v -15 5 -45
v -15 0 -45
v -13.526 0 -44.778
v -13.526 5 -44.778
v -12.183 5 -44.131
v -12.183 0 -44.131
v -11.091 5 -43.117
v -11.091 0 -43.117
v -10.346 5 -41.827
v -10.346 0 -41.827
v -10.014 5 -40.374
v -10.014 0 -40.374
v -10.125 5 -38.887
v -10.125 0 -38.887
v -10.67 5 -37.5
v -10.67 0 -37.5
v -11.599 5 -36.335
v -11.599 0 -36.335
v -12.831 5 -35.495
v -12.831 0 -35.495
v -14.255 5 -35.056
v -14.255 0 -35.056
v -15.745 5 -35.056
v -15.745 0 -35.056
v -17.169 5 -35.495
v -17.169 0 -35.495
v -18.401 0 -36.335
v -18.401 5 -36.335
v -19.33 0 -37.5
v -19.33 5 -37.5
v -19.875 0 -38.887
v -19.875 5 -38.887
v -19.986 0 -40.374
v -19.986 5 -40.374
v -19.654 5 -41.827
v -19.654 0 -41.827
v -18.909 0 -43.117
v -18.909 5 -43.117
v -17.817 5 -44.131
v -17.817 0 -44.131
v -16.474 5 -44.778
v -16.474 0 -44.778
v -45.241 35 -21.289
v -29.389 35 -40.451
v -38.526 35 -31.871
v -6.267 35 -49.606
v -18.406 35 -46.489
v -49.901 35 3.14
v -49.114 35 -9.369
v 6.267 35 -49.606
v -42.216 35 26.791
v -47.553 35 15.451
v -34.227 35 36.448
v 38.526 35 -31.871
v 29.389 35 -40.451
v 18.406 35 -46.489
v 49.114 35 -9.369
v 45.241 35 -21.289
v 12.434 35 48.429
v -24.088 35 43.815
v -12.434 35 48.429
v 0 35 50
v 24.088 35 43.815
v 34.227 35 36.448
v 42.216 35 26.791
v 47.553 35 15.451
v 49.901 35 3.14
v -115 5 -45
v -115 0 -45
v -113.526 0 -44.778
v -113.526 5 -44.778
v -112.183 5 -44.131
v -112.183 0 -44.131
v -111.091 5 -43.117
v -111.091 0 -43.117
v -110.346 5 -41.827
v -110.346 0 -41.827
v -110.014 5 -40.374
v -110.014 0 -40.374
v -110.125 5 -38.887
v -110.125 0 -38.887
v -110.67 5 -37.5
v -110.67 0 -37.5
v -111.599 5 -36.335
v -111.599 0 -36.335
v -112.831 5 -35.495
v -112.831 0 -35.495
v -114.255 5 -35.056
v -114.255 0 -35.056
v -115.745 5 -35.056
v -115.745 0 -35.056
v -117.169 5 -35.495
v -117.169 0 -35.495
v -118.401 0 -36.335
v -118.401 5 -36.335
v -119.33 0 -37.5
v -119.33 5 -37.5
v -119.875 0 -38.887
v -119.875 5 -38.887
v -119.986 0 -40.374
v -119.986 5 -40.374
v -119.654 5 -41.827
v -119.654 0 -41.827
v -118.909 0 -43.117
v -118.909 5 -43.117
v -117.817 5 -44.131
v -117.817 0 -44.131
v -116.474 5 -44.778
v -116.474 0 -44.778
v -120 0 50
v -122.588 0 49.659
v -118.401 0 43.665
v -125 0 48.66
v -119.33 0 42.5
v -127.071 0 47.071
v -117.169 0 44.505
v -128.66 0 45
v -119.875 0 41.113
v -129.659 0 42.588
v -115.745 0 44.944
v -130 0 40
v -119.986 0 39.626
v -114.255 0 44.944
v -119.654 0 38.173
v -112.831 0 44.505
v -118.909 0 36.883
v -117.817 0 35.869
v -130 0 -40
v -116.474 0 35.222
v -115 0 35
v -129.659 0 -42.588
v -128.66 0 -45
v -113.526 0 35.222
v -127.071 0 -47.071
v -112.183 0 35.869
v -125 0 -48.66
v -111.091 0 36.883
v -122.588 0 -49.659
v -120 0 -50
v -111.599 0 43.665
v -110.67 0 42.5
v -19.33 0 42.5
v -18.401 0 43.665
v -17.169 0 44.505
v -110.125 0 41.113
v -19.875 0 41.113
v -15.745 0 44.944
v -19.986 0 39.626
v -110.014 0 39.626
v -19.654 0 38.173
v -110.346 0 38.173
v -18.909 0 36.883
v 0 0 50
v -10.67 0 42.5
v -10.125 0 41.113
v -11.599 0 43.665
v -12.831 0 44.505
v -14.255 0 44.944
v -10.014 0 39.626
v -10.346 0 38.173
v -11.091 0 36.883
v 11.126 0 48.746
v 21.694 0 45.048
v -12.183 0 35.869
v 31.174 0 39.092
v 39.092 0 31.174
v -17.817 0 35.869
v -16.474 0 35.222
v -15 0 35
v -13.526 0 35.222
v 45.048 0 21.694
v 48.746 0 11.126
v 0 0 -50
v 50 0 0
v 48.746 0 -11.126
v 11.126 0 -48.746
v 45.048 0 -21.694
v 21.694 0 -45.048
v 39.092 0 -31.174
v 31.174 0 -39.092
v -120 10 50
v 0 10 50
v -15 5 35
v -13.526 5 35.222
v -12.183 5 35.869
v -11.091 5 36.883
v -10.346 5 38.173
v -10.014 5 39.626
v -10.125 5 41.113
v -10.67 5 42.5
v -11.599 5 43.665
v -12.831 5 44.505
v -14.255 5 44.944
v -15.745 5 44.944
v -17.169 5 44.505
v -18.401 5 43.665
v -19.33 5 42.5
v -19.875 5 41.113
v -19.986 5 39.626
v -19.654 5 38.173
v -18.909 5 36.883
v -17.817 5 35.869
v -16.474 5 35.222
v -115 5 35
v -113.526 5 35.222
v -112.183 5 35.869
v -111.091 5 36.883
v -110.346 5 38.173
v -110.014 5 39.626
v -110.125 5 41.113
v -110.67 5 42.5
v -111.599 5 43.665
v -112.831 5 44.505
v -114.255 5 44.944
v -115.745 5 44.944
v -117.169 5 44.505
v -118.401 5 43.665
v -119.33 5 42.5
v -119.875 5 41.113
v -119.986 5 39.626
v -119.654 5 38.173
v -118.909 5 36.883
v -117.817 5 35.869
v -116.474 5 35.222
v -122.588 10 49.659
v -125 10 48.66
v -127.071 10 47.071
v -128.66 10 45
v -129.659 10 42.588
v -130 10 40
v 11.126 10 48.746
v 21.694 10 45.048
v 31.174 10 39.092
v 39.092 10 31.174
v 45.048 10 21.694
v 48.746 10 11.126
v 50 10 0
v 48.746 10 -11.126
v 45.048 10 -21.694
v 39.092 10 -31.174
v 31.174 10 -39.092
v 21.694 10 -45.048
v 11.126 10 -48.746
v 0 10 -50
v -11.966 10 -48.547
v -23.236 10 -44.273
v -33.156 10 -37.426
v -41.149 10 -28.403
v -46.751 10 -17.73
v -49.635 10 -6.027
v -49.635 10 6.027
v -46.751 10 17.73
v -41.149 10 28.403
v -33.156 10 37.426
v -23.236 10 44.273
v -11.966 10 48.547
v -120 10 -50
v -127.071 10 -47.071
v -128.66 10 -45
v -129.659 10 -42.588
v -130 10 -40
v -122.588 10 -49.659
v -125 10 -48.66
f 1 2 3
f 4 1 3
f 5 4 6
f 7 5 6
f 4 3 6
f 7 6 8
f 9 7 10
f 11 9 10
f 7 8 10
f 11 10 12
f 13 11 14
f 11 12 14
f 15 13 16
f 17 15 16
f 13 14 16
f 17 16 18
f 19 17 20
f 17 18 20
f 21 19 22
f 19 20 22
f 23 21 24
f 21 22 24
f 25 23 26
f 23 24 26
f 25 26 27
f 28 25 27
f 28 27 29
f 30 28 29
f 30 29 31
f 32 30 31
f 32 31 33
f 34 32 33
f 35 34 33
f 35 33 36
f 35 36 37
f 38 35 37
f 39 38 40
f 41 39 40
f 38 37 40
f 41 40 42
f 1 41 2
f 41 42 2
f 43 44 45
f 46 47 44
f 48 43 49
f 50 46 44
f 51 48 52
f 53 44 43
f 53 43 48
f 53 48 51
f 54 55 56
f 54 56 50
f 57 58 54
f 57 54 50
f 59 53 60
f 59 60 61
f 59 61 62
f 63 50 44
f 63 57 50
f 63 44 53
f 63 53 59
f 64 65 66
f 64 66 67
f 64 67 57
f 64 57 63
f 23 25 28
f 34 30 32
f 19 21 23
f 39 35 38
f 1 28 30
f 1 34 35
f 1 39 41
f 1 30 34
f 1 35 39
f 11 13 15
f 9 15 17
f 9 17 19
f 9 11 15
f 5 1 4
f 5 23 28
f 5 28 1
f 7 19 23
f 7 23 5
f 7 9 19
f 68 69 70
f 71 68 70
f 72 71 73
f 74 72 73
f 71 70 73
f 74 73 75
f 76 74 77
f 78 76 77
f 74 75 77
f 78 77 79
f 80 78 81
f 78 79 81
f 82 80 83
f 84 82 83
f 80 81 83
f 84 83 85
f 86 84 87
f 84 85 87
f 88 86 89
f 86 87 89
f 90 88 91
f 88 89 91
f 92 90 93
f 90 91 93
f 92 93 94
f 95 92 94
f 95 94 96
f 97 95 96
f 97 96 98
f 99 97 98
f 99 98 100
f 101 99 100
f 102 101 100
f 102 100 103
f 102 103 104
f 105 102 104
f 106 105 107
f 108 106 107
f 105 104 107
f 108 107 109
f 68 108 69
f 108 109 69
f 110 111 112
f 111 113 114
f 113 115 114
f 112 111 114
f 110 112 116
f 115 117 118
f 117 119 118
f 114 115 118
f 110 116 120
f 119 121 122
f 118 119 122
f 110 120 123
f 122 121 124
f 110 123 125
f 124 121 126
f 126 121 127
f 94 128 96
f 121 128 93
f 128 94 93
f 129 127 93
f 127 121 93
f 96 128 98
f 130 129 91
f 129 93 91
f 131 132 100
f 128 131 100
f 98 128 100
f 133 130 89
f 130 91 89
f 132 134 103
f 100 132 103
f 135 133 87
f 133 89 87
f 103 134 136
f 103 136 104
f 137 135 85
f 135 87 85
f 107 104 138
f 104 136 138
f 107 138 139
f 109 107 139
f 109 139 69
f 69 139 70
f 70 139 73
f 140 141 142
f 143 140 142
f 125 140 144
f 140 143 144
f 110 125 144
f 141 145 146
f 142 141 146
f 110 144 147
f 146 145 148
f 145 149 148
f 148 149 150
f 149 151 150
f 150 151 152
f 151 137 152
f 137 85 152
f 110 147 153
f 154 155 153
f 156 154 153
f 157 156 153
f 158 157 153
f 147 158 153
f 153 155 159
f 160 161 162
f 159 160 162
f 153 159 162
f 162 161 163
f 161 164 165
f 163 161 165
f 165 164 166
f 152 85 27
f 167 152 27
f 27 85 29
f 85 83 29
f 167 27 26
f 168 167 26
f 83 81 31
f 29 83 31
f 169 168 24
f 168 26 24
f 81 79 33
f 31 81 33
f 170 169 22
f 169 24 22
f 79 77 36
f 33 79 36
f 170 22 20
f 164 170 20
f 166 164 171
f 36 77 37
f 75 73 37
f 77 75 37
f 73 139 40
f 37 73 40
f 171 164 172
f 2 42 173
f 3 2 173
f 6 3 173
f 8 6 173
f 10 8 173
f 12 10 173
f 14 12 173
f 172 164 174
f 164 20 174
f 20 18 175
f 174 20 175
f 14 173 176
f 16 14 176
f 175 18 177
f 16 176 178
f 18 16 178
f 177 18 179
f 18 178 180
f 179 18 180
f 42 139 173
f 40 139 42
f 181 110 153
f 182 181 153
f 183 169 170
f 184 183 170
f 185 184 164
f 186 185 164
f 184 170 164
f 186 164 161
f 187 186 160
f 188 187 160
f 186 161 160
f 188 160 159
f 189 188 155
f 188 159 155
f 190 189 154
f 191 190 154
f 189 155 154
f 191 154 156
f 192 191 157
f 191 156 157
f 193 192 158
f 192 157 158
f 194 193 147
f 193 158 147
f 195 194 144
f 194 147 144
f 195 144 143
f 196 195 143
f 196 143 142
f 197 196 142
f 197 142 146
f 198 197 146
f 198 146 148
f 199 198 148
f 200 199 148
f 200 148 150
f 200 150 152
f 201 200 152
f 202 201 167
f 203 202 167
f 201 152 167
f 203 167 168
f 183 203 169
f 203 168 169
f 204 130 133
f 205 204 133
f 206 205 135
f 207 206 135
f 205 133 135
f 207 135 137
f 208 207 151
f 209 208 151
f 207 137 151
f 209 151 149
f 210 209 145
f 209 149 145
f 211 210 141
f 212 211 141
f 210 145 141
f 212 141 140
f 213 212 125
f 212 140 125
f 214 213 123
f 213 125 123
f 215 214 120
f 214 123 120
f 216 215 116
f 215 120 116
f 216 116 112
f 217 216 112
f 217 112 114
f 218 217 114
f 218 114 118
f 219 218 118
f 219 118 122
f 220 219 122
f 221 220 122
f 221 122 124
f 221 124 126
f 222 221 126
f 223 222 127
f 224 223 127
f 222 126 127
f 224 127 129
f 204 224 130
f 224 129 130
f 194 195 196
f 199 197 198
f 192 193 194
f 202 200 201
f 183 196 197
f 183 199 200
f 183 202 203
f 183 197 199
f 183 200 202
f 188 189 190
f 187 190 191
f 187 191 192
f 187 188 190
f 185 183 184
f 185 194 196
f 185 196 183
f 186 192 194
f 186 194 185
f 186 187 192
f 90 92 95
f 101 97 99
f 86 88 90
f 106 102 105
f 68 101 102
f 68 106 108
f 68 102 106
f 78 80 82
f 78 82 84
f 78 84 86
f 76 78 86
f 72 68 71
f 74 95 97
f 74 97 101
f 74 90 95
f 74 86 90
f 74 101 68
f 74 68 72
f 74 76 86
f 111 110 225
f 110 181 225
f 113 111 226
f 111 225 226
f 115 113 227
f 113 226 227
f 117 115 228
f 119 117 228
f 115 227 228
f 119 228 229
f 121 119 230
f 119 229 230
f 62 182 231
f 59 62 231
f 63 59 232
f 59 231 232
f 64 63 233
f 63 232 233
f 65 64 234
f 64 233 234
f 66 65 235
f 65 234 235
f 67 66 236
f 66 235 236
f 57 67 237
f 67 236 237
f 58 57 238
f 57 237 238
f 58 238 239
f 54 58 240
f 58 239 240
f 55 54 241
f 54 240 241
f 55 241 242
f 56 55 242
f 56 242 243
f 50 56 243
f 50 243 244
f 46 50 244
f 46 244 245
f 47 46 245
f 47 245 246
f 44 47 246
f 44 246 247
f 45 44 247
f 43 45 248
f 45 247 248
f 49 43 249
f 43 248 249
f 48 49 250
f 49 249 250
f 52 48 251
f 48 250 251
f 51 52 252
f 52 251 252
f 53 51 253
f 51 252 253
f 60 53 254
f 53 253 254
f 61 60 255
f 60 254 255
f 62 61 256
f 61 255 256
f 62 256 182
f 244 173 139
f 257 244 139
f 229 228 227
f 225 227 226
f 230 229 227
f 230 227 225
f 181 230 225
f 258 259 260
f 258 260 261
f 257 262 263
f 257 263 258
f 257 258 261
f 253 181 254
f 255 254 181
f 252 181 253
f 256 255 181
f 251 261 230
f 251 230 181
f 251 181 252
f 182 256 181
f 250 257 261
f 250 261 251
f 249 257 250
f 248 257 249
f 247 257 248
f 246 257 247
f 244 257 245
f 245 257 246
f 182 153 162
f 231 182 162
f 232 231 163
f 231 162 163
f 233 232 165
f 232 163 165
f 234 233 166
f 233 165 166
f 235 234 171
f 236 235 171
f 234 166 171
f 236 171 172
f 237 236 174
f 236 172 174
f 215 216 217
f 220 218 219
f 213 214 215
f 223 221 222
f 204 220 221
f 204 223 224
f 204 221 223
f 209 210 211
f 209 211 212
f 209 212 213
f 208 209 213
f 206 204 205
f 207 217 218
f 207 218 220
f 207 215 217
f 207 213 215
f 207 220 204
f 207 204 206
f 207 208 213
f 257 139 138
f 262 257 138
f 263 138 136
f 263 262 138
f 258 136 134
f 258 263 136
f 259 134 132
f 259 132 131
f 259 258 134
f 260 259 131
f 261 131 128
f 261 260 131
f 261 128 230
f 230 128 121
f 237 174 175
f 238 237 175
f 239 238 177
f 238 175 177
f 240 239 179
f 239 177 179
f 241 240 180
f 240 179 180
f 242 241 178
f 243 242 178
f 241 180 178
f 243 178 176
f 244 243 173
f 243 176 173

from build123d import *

# Parameters (mm, degrees)
BOSS_EXTRUDE8_DEPTH = 10
SKETCH8_R           = 50
BOSS_EXTRUDE9_DEPTH = 25
SKETCH9_R           = 5
CUT_EXTRUDE8_DEPTH  = 5
FILLET1_R           = 10


with BuildPart() as part:
    # Sketch1 → Boss-Extrude8 (new body)
    with BuildSketch(Plane(origin=(0, 0, 0), x_dir=(1, 0, 0), z_dir=(0, 1, 0))):
        with BuildLine():
            ThreePointArc((50, 0), (35.355339059, 35.355339059), (0, 50))
            Line((0, 50), (0, -50))
            ThreePointArc((0, -50), (35.355339059, -35.355339059), (50, 0))
        make_face()
        with BuildLine():
            Line((0, -50), (0, 50))
            ThreePointArc((0, 50), (-50, 0), (0, -50))
        make_face()
        with BuildLine():
            ThreePointArc((0, -50), (-50, 0), (0, 50))
            Line((0, 50), (-130, 50))
            Line((-130, 50), (-130, -50))
            Line((-130, -50), (0, -50))
        make_face()
    extrude(amount=BOSS_EXTRUDE8_DEPTH)

    # Sketch8 → Boss-Extrude9 (add)
    with BuildSketch(Plane(origin=(0, 10, 0), x_dir=(1, 0, 0), z_dir=(0, 1, 0))):
        with Locations(Location((0, 0, 0), (0, 0, 270))):
            Circle(SKETCH8_R)
    extrude(amount=BOSS_EXTRUDE9_DEPTH)

    # Sketch9 → Cut-Extrude8 (cut)
    with BuildSketch(Plane.XZ):
        with Locations(Location((-15, 40, 0), (0, 0, 270))):
            Circle(SKETCH9_R)
        with Locations(Location((-15, -40, 0), (0, 0, 270))):
            Circle(SKETCH9_R)
        with Locations(Location((-115, -40, 0), (0, 0, 270))):
            Circle(SKETCH9_R)
        with Locations(Location((-115, 40, 0), (0, 0, 270))):
            Circle(SKETCH9_R)
    extrude(amount=-CUT_EXTRUDE8_DEPTH, mode=Mode.SUBTRACT)

    # Fillet1
    fillet1_edges = [part.edges().sort_by_distance(p)[0] for p in [
        (-130, 5, 50),
        (-130, 5, -50),
    ]]
    fillet(fillet1_edges, radius=FILLET1_R)


solid = part.part
